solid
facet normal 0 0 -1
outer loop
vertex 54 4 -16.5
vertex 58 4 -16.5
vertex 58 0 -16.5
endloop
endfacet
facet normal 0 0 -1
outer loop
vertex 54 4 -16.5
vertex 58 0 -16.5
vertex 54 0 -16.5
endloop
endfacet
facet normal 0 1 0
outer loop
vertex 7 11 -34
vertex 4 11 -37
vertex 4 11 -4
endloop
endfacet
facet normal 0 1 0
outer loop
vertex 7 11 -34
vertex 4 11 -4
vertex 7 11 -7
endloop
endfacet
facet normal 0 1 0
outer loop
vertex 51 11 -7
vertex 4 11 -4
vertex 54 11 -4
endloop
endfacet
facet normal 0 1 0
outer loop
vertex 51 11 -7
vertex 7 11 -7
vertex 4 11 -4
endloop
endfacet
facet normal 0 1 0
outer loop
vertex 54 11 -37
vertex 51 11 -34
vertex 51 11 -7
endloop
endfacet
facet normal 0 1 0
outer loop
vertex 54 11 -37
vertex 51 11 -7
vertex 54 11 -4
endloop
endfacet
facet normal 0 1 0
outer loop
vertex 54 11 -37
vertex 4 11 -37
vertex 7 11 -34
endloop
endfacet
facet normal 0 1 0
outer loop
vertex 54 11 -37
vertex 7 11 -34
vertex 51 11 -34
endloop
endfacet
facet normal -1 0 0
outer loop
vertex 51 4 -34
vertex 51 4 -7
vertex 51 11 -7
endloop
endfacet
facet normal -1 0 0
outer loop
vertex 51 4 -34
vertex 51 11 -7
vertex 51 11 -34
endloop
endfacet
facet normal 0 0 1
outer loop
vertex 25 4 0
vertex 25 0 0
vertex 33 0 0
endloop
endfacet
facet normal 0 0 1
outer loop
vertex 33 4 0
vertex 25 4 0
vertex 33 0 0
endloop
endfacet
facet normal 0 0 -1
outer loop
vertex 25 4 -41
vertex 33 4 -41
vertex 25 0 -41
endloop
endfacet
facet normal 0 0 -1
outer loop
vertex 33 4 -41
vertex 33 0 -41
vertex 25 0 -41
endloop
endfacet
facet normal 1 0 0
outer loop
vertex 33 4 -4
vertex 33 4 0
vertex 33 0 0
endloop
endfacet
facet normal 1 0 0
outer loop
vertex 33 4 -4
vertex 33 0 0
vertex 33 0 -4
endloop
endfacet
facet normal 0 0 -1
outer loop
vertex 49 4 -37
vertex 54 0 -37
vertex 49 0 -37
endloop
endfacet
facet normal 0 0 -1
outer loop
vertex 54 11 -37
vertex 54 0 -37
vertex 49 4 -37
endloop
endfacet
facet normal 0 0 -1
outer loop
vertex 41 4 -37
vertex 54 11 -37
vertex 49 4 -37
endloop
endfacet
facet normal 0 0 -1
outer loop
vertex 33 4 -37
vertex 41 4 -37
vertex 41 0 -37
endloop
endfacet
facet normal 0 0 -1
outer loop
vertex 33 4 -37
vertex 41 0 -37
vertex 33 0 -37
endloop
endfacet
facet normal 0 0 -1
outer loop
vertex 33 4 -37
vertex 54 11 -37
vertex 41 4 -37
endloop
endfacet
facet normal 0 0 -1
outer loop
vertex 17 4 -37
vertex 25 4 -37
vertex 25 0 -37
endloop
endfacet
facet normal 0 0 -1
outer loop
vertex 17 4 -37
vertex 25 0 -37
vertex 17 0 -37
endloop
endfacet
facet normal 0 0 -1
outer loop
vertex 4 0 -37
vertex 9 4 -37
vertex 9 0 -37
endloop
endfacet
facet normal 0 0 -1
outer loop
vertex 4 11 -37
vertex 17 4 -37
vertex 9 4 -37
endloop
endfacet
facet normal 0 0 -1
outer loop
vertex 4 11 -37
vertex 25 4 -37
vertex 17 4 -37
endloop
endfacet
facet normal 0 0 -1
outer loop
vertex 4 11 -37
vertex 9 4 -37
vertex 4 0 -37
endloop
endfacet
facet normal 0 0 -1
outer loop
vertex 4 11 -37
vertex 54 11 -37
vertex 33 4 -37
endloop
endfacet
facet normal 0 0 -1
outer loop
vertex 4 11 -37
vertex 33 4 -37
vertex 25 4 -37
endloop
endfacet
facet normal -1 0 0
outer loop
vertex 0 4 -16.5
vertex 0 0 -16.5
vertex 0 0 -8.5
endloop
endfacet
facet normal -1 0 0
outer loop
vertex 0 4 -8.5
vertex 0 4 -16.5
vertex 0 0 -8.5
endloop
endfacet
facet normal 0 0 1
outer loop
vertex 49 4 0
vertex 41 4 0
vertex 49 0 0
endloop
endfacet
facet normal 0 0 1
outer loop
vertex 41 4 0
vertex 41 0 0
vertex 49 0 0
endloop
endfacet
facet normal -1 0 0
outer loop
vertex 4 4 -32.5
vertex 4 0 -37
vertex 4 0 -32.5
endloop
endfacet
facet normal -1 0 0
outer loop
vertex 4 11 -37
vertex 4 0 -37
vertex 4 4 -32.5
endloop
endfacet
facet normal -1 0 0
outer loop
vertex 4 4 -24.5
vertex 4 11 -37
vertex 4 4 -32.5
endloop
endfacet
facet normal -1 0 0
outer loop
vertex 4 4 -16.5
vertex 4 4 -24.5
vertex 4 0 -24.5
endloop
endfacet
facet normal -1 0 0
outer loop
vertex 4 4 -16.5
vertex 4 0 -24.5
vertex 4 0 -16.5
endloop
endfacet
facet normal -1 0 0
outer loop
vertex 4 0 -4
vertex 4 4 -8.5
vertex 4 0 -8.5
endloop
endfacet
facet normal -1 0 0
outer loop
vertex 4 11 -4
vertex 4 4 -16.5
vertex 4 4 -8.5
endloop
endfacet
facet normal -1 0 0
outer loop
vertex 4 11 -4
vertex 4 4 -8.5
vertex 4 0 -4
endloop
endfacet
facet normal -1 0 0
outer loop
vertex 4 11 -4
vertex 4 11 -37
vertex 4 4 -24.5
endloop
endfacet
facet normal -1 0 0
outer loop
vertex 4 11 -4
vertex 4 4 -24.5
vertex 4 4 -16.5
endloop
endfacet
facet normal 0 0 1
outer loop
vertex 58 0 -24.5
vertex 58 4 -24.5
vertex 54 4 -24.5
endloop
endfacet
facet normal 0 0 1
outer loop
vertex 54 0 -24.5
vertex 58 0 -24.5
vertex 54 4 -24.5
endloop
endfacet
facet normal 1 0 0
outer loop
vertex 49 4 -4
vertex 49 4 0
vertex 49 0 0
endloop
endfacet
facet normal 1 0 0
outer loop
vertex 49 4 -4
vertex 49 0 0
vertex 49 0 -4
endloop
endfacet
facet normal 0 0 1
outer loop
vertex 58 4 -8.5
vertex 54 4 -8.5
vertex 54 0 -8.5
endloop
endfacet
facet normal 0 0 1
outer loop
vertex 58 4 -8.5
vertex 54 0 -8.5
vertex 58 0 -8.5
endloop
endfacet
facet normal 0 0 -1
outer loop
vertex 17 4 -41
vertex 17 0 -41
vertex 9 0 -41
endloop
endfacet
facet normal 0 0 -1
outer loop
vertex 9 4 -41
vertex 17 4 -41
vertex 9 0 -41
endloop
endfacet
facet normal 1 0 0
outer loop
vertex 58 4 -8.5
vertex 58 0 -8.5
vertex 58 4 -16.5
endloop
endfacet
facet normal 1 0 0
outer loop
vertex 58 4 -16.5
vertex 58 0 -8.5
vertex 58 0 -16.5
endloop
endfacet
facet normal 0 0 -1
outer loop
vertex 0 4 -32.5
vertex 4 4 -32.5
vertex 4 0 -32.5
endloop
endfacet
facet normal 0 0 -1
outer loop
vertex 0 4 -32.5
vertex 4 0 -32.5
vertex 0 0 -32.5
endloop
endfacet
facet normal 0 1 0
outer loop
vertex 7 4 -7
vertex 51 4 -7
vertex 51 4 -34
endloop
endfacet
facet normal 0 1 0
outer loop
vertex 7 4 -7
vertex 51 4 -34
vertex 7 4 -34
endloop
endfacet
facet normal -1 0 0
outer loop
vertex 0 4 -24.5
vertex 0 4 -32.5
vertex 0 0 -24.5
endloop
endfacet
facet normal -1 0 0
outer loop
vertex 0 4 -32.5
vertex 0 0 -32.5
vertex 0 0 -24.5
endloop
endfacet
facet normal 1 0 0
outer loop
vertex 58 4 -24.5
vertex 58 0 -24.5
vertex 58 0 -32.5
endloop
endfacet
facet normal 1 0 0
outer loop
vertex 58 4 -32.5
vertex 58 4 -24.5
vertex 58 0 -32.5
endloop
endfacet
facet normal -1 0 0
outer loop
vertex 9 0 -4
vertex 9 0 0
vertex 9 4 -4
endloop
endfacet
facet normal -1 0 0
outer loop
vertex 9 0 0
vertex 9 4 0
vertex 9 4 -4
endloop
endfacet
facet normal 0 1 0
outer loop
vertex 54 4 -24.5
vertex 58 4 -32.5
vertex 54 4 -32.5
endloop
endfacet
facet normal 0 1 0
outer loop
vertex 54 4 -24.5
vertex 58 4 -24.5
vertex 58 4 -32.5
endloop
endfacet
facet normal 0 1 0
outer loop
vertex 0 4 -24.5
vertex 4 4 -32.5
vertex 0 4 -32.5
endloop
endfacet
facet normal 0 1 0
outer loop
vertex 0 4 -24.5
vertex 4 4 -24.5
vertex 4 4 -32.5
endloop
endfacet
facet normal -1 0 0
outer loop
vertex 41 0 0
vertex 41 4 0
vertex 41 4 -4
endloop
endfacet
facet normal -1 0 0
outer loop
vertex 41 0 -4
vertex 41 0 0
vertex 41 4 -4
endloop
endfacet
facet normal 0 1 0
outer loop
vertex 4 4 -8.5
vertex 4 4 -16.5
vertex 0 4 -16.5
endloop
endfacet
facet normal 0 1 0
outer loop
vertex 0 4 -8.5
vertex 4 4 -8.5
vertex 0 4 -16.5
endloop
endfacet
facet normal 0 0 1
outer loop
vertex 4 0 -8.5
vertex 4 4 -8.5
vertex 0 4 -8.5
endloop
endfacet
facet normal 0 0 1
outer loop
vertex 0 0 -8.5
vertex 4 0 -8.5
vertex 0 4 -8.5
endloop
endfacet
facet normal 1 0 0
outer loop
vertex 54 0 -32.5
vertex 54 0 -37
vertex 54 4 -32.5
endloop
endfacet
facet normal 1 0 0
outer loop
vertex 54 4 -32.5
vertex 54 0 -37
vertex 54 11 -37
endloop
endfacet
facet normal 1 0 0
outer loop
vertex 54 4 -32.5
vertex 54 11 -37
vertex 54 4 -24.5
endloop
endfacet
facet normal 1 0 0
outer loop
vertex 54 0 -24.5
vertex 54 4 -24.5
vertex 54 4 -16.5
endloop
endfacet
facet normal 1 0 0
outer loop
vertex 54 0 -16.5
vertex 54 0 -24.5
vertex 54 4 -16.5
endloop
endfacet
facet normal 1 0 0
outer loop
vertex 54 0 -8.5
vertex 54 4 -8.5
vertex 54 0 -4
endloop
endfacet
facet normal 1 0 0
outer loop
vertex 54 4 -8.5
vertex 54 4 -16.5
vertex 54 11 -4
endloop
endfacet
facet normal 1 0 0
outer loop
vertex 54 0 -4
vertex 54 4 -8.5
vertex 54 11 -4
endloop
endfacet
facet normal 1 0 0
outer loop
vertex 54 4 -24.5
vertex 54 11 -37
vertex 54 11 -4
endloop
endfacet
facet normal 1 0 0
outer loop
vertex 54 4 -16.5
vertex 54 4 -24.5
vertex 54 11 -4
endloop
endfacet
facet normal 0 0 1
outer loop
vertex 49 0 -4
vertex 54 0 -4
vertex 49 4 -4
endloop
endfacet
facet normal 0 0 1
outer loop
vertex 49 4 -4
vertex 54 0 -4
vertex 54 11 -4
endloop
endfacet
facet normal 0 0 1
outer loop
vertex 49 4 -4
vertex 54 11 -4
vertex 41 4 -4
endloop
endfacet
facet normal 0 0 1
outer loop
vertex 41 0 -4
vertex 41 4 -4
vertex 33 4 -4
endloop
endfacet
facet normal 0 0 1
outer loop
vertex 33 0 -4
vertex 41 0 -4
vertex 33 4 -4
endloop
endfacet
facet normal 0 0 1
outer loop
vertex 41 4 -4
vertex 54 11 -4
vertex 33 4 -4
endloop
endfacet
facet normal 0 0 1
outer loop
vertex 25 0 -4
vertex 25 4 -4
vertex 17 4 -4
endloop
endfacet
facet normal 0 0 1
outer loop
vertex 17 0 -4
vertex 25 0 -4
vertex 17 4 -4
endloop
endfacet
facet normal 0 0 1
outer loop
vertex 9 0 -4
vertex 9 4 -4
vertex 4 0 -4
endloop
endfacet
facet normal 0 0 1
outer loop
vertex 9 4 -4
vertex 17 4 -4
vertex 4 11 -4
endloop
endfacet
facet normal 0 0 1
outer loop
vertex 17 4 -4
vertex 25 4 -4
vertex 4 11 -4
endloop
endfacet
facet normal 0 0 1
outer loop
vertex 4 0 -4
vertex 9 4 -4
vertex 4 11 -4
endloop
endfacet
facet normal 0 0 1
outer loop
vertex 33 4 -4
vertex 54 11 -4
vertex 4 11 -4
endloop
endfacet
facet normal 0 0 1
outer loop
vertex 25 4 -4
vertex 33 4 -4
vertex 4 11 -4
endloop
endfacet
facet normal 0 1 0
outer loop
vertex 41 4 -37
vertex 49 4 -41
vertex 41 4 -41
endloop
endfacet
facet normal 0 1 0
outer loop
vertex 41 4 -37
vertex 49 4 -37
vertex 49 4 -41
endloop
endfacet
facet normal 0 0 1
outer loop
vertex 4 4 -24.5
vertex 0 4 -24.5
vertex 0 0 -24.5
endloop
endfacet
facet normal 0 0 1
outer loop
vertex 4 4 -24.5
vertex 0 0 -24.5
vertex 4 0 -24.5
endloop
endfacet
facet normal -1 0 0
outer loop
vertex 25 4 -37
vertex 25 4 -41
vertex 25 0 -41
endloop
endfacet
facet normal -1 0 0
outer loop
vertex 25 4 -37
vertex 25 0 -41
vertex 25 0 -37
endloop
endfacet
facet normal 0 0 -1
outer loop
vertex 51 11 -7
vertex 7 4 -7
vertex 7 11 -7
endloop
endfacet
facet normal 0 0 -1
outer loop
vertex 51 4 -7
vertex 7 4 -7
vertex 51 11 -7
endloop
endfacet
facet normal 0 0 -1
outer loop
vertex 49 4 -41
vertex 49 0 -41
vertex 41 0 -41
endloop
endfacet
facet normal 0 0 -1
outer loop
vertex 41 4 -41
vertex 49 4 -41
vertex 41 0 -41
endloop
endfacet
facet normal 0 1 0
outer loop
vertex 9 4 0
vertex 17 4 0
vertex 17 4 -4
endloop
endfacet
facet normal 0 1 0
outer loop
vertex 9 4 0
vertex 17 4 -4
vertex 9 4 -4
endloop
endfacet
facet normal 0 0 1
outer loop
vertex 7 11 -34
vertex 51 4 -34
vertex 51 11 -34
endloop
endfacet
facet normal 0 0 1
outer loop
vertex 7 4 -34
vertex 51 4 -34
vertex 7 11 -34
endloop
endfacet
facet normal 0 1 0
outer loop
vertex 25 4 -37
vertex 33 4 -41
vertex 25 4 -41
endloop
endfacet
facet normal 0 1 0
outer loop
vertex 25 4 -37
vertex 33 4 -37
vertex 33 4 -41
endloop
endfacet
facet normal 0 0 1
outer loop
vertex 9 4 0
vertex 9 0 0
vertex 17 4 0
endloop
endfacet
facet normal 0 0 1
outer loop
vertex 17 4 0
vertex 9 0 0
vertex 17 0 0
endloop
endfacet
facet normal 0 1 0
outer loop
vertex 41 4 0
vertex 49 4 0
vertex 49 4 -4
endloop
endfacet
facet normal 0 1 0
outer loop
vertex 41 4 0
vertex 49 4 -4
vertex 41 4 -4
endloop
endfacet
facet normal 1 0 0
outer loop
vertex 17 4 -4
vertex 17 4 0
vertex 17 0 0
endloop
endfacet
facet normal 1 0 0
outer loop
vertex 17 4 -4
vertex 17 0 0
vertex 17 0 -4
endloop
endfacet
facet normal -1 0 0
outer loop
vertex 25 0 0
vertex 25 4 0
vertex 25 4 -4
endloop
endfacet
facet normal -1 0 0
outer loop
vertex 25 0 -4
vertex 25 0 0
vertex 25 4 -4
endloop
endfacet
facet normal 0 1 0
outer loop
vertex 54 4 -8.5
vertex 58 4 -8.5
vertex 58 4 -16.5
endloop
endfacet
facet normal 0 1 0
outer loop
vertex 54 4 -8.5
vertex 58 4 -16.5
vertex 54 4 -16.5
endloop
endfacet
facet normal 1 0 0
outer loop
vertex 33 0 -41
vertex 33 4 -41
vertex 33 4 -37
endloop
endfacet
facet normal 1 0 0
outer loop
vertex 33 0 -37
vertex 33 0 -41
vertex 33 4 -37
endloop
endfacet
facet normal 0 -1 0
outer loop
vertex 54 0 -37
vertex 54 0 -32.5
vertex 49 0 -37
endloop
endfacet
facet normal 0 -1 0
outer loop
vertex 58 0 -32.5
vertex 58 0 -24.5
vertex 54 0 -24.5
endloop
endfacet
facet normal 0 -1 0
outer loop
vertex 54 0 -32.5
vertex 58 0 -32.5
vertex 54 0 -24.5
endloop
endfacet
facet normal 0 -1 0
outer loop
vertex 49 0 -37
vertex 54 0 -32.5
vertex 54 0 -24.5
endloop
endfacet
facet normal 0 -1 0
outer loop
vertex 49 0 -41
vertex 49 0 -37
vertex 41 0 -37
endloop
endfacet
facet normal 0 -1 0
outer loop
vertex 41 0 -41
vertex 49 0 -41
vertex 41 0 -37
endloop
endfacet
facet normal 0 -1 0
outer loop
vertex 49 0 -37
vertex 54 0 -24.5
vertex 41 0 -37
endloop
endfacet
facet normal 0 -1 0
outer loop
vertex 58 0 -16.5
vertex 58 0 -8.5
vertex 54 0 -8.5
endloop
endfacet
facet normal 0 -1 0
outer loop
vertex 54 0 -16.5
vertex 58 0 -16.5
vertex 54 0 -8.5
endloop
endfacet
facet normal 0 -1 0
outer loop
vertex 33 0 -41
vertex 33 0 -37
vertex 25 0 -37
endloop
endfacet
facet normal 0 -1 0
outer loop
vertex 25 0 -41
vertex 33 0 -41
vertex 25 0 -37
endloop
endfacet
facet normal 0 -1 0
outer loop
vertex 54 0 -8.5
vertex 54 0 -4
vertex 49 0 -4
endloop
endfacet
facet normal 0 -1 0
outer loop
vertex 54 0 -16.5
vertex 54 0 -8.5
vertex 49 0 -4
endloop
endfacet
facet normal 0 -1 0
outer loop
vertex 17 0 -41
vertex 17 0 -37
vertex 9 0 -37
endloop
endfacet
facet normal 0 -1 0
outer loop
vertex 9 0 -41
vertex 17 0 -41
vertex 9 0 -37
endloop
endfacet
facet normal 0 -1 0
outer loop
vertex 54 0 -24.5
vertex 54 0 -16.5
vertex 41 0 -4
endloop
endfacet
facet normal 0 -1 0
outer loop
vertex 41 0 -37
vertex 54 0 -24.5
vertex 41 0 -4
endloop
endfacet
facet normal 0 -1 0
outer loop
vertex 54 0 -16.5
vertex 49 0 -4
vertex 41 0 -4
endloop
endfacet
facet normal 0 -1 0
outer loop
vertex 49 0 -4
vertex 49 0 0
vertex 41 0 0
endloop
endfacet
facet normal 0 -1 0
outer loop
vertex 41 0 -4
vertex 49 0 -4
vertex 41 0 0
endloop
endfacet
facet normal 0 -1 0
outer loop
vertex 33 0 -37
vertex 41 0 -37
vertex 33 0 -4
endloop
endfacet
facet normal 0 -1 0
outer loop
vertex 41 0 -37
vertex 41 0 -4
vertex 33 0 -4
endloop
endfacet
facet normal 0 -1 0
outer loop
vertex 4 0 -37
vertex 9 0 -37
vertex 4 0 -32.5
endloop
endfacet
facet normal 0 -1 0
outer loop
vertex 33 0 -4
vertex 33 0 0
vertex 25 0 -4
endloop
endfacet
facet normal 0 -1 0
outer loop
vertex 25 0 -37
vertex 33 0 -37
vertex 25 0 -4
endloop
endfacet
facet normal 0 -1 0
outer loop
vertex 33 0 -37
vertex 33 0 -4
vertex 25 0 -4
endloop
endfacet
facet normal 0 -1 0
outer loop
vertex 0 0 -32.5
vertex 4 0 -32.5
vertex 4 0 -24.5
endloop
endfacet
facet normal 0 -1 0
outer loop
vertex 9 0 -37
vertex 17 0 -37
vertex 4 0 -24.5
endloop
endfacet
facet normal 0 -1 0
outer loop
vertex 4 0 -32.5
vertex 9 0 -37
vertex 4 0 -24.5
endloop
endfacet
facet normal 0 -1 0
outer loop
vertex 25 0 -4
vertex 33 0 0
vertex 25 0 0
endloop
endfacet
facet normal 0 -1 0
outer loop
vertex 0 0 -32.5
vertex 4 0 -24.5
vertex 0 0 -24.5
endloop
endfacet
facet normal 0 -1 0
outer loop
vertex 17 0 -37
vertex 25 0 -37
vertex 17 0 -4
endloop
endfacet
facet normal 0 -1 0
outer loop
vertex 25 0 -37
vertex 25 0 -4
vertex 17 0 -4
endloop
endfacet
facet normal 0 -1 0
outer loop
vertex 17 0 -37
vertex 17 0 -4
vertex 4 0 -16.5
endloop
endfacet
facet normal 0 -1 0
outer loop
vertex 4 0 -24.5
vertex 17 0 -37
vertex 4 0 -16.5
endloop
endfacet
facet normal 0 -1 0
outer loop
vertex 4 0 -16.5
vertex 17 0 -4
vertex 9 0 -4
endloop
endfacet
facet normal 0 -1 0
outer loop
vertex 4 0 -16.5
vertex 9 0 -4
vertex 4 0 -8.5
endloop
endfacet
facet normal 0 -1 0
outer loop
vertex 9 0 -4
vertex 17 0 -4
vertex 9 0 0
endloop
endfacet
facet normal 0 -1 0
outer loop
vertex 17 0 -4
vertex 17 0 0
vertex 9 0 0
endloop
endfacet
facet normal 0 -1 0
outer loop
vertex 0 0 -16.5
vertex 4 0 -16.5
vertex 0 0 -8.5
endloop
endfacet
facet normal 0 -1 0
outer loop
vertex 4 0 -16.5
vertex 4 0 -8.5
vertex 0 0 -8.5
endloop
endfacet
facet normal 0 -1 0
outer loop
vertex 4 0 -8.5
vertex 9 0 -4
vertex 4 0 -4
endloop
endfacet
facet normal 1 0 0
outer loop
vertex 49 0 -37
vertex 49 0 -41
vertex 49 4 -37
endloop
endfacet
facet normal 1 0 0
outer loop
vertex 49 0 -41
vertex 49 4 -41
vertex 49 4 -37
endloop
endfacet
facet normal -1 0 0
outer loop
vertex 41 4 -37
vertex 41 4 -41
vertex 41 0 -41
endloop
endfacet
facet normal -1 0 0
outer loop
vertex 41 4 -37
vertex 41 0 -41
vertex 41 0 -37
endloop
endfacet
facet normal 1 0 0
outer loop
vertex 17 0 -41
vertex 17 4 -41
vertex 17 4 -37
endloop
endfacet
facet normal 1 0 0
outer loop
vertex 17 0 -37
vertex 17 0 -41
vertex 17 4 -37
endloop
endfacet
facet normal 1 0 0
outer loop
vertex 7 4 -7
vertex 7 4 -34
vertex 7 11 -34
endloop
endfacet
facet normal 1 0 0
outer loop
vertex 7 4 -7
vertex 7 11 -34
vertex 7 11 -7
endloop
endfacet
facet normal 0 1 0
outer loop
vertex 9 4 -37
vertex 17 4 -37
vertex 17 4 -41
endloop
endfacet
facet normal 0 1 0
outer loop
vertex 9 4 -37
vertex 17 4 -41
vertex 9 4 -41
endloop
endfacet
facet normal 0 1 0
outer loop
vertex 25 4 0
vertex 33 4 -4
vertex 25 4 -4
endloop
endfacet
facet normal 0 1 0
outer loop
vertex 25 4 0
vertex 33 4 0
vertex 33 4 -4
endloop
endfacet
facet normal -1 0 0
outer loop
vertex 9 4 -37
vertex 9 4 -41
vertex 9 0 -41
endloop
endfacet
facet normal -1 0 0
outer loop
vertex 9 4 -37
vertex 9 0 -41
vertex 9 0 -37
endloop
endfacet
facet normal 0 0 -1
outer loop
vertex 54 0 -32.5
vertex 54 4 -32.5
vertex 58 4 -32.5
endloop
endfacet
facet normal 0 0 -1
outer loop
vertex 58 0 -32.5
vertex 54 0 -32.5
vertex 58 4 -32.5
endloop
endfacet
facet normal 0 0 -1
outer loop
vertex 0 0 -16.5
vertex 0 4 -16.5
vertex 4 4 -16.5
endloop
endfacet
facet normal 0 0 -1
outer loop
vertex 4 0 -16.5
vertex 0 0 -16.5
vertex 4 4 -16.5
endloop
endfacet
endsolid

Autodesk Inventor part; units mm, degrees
ref_plane "YZ Plane" through (0, 0, 0) normal (1, 0, 0) x (0, 1, 0)
ref_plane "XZ Plane" through (0, 0, 0) normal (0, 1, 0) x (-1, 0, 0)
ref_plane "XY Plane" through (0, 0, 0) normal (0, 0, 1) x (1, 0, 0)
sketch "Sketch1" plane through (0, 0, 0) normal (0, 1, 0) x (-1, 0, 0)
  line L0 (0, 0) -> (-58, 0)
  line L1 (-58, 0) -> (-58, -41)
  line L2 (-58, -41) -> (0, -41)
  line L3 (0, -41) -> (0, 0)
  dimension "d0" = 58
  dimension "d1" = 41
extrude "Extrusion1" add sketch "Sketch1" along normal blind 4
sketch "Sketch2" plane through (0, 4, 0) normal (0, 1, 0) x (1, 0, 0)
  line L0 (0, 0) -> (58, 0) projected
  line L1 (58, 0) -> (58, 41) projected
  line L2 (58, 41) -> (0, 41) projected
  line L3 (0, 41) -> (0, 0) projected
  line L4 (4, 37) -> (54, 37)
  line L5 (54, 37) -> (54, 4)
  line L6 (54, 4) -> (4, 4)
  line L7 (4, 4) -> (4, 37)
  line L8 (51, 34) -> (7, 34)
  line L9 (7, 34) -> (7, 7)
  line L10 (7, 7) -> (51, 7)
  line L11 (51, 7) -> (51, 34)
  dimension "d4" = 4
  dimension "d5" = 3
extrude "Extrusion2" add sketch "Sketch2" along normal blind 7 contours L4 L5 L6 L7
sketch "Sketch3" plane through (0, 4, 0) normal (0, 1, 0) x (1, 0, 0)
  line L0 (0, 0) -> (58, 0) construction
  line L1 (58, 0) -> (58, 41) construction
  line L2 (58, 41) -> (0, 41) construction
  line L3 (0, 41) -> (0, 0) construction
  line L4 (54, 37) -> (54, 4) construction
  line L5 (54, 4) -> (4, 4) construction
  line L6 (4, 4) -> (4, 37) construction
  line L7 (4, 37) -> (54, 37) construction
  line L8 (58, 41) -> (0, 41) construction
  line L9 (29, 41) -> (29, 0) construction
  line L10 (0, 41) -> (0, 0) construction
  line L11 (0, 20.5) -> (58, 20.5) construction
  line L12 (58, 0) -> (58, 41) construction
  line L13 (4, 37) -> (4, 4) projected
  line L14 (4, 8.5) -> (0, 8.5)
  line L15 (0, 8.5) -> (0, 0)
  line L16 (0, 0) -> (9, 0)
  line L17 (0, 0) -> (58, 0) projected
  line L18 (9, 0) -> (9, 4)
  line L19 (54, 4) -> (4, 4) projected
  line L20 (9, 4) -> (4, 4)
  line L21 (4, 8.5) -> (4, 4)
  line L22 (17, 0) -> (17, 4)
  line L23 (17, 0) -> (25, 0)
  line L24 (25, 0) -> (25, 4)
  line L25 (25, 4) -> (17, 4)
  line L26 (0, 16.5) -> (4, 16.5)
  line L27 (4, 16.5) -> (4, 20.5)
  line L28 (0, 20.5) -> (0, 16.5)
  line L29 (4, 32.5) -> (0, 32.5)
  line L30 (0, 32.5) -> (0, 41)
  line L31 (0, 41) -> (9, 41)
  line L32 (9, 41) -> (9, 37)
  line L33 (9, 37) -> (4, 37)
  line L34 (4, 32.5) -> (4, 37)
  line L35 (17, 41) -> (17, 37)
  line L36 (17, 41) -> (25, 41)
  line L37 (25, 41) -> (25, 37)
  line L38 (25, 37) -> (17, 37)
  line L39 (0, 24.5) -> (4, 24.5)
  line L40 (4, 24.5) -> (4, 20.5)
  line L41 (0, 20.5) -> (0, 24.5)
  line L42 (58, 41) -> (58, 0) construction
  line L43 (54, 4) -> (54, 37) construction
  line L44 (58, 41) -> (58, 0) construction
  line L45 (54, 37) -> (54, 4)
  line L46 (54, 8.5) -> (58, 8.5)
  line L47 (58, 8.5) -> (58, 0)
  line L48 (58, 0) -> (49, 0)
  line L49 (49, 0) -> (49, 4)
  line L50 (49, 4) -> (54, 4)
  line L51 (54, 8.5) -> (54, 4)
  line L52 (41, 0) -> (41, 4)
  line L53 (41, 0) -> (33, 0)
  line L54 (33, 0) -> (33, 4)
  line L55 (33, 4) -> (41, 4)
  line L56 (58, 16.5) -> (54, 16.5)
  line L57 (54, 16.5) -> (54, 20.5)
  line L58 (58, 20.5) -> (58, 16.5)
  line L59 (41, 41) -> (33, 41)
  line L60 (33, 41) -> (33, 37)
  line L61 (33, 37) -> (41, 37)
  line L62 (54, 32.5) -> (54, 37)
  line L63 (54, 24.5) -> (54, 20.5)
  line L64 (54, 32.5) -> (58, 32.5)
  line L65 (58, 32.5) -> (58, 41)
  line L66 (58, 24.5) -> (54, 24.5)
  line L67 (58, 20.5) -> (58, 24.5)
  line L68 (49, 41) -> (49, 37)
  line L69 (49, 37) -> (54, 37)
  line L70 (58, 41) -> (49, 41)
  line L71 (41, 41) -> (41, 37)
  dimension "d8" = 8
  dimension "d9" = 8
  dimension "d10" = 4
  dimension "d13" = 4
  dimension "d14" = 8
extrude "Extrusion3" cut sketch "Sketch3" against normal up to surface (4 mm away) contours L45 L69 L68 L70 L65 L64 | L45 L66 L67 L58 L56 | L13 L19 L18 L16 L15 L14 | L13 L26 L28 L41 L39 | L13 L29 L30 L31 L32 L33 | L19 L24 L17 L22 | L19 L52 L17 L54 | L19 L45 L46 L47 L17 L49 | L36 L37 L38 L35 | L71 L61 L60 L59
properties part number "bottom" material "PBT Plastic Black"
